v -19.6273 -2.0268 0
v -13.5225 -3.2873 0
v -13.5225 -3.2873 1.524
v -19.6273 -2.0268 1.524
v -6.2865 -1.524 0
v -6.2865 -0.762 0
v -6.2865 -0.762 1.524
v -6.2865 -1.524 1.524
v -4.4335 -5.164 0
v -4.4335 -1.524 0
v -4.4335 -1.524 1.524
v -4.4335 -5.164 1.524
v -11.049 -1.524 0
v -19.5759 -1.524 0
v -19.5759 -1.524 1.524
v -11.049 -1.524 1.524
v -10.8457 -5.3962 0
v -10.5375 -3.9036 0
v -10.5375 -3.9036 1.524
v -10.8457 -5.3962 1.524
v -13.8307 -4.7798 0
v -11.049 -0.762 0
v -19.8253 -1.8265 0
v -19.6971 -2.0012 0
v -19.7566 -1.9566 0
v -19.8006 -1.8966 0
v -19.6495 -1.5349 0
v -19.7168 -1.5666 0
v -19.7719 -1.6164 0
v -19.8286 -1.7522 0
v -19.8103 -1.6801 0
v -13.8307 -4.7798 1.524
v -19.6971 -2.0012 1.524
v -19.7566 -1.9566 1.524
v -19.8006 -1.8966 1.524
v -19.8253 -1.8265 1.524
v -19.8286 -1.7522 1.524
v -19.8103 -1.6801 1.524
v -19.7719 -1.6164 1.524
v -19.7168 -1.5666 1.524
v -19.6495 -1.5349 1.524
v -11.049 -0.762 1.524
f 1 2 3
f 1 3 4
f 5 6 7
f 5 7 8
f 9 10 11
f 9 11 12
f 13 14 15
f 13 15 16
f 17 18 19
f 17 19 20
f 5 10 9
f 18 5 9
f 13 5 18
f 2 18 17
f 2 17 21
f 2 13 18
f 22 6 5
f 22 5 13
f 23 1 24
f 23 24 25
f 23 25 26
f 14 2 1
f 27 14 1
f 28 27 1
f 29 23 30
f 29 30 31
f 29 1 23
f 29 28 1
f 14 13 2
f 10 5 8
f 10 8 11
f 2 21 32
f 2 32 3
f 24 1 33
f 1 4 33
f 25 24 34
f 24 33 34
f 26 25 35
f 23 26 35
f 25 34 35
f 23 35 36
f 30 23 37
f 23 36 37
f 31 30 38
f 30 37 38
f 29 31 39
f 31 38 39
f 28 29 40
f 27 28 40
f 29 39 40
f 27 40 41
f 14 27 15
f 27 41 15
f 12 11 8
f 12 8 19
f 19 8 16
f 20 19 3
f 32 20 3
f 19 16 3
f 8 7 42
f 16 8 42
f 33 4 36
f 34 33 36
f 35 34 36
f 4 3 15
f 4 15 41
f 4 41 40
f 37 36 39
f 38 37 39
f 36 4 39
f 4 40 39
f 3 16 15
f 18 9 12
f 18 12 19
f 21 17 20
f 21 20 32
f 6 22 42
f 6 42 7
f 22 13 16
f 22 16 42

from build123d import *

# Parameters (mm, degrees)
BOSS_EXTRUDE1_DEPTH = 1.524
FILLET1_R           = 0.254


with BuildPart() as part:
    # Sketch1 → Boss-Extrude1 (new body)
    with BuildSketch(Plane.XY):
        Polygon((-6.2865, -0.762), (-6.2865, -1.524), (-4.433524529, -1.524), (-4.433524529, -5.163998713), (-10.537505967, -3.903634867), (-10.84568392, -5.39615031), (-13.830714807, -4.779794404), (-13.522536854, -3.287278961), (-22.062151888, -1.524), (-11.049, -1.524), (-11.049, -0.762), align=None)
    extrude(amount=BOSS_EXTRUDE1_DEPTH)

    # Fillet1
    fillet1_edges = [part.edges().sort_by_distance(p)[0] for p in [
        (-22.062151888, -1.524, 0.762),
    ]]
    fillet(fillet1_edges, radius=FILLET1_R)


solid = part.part
